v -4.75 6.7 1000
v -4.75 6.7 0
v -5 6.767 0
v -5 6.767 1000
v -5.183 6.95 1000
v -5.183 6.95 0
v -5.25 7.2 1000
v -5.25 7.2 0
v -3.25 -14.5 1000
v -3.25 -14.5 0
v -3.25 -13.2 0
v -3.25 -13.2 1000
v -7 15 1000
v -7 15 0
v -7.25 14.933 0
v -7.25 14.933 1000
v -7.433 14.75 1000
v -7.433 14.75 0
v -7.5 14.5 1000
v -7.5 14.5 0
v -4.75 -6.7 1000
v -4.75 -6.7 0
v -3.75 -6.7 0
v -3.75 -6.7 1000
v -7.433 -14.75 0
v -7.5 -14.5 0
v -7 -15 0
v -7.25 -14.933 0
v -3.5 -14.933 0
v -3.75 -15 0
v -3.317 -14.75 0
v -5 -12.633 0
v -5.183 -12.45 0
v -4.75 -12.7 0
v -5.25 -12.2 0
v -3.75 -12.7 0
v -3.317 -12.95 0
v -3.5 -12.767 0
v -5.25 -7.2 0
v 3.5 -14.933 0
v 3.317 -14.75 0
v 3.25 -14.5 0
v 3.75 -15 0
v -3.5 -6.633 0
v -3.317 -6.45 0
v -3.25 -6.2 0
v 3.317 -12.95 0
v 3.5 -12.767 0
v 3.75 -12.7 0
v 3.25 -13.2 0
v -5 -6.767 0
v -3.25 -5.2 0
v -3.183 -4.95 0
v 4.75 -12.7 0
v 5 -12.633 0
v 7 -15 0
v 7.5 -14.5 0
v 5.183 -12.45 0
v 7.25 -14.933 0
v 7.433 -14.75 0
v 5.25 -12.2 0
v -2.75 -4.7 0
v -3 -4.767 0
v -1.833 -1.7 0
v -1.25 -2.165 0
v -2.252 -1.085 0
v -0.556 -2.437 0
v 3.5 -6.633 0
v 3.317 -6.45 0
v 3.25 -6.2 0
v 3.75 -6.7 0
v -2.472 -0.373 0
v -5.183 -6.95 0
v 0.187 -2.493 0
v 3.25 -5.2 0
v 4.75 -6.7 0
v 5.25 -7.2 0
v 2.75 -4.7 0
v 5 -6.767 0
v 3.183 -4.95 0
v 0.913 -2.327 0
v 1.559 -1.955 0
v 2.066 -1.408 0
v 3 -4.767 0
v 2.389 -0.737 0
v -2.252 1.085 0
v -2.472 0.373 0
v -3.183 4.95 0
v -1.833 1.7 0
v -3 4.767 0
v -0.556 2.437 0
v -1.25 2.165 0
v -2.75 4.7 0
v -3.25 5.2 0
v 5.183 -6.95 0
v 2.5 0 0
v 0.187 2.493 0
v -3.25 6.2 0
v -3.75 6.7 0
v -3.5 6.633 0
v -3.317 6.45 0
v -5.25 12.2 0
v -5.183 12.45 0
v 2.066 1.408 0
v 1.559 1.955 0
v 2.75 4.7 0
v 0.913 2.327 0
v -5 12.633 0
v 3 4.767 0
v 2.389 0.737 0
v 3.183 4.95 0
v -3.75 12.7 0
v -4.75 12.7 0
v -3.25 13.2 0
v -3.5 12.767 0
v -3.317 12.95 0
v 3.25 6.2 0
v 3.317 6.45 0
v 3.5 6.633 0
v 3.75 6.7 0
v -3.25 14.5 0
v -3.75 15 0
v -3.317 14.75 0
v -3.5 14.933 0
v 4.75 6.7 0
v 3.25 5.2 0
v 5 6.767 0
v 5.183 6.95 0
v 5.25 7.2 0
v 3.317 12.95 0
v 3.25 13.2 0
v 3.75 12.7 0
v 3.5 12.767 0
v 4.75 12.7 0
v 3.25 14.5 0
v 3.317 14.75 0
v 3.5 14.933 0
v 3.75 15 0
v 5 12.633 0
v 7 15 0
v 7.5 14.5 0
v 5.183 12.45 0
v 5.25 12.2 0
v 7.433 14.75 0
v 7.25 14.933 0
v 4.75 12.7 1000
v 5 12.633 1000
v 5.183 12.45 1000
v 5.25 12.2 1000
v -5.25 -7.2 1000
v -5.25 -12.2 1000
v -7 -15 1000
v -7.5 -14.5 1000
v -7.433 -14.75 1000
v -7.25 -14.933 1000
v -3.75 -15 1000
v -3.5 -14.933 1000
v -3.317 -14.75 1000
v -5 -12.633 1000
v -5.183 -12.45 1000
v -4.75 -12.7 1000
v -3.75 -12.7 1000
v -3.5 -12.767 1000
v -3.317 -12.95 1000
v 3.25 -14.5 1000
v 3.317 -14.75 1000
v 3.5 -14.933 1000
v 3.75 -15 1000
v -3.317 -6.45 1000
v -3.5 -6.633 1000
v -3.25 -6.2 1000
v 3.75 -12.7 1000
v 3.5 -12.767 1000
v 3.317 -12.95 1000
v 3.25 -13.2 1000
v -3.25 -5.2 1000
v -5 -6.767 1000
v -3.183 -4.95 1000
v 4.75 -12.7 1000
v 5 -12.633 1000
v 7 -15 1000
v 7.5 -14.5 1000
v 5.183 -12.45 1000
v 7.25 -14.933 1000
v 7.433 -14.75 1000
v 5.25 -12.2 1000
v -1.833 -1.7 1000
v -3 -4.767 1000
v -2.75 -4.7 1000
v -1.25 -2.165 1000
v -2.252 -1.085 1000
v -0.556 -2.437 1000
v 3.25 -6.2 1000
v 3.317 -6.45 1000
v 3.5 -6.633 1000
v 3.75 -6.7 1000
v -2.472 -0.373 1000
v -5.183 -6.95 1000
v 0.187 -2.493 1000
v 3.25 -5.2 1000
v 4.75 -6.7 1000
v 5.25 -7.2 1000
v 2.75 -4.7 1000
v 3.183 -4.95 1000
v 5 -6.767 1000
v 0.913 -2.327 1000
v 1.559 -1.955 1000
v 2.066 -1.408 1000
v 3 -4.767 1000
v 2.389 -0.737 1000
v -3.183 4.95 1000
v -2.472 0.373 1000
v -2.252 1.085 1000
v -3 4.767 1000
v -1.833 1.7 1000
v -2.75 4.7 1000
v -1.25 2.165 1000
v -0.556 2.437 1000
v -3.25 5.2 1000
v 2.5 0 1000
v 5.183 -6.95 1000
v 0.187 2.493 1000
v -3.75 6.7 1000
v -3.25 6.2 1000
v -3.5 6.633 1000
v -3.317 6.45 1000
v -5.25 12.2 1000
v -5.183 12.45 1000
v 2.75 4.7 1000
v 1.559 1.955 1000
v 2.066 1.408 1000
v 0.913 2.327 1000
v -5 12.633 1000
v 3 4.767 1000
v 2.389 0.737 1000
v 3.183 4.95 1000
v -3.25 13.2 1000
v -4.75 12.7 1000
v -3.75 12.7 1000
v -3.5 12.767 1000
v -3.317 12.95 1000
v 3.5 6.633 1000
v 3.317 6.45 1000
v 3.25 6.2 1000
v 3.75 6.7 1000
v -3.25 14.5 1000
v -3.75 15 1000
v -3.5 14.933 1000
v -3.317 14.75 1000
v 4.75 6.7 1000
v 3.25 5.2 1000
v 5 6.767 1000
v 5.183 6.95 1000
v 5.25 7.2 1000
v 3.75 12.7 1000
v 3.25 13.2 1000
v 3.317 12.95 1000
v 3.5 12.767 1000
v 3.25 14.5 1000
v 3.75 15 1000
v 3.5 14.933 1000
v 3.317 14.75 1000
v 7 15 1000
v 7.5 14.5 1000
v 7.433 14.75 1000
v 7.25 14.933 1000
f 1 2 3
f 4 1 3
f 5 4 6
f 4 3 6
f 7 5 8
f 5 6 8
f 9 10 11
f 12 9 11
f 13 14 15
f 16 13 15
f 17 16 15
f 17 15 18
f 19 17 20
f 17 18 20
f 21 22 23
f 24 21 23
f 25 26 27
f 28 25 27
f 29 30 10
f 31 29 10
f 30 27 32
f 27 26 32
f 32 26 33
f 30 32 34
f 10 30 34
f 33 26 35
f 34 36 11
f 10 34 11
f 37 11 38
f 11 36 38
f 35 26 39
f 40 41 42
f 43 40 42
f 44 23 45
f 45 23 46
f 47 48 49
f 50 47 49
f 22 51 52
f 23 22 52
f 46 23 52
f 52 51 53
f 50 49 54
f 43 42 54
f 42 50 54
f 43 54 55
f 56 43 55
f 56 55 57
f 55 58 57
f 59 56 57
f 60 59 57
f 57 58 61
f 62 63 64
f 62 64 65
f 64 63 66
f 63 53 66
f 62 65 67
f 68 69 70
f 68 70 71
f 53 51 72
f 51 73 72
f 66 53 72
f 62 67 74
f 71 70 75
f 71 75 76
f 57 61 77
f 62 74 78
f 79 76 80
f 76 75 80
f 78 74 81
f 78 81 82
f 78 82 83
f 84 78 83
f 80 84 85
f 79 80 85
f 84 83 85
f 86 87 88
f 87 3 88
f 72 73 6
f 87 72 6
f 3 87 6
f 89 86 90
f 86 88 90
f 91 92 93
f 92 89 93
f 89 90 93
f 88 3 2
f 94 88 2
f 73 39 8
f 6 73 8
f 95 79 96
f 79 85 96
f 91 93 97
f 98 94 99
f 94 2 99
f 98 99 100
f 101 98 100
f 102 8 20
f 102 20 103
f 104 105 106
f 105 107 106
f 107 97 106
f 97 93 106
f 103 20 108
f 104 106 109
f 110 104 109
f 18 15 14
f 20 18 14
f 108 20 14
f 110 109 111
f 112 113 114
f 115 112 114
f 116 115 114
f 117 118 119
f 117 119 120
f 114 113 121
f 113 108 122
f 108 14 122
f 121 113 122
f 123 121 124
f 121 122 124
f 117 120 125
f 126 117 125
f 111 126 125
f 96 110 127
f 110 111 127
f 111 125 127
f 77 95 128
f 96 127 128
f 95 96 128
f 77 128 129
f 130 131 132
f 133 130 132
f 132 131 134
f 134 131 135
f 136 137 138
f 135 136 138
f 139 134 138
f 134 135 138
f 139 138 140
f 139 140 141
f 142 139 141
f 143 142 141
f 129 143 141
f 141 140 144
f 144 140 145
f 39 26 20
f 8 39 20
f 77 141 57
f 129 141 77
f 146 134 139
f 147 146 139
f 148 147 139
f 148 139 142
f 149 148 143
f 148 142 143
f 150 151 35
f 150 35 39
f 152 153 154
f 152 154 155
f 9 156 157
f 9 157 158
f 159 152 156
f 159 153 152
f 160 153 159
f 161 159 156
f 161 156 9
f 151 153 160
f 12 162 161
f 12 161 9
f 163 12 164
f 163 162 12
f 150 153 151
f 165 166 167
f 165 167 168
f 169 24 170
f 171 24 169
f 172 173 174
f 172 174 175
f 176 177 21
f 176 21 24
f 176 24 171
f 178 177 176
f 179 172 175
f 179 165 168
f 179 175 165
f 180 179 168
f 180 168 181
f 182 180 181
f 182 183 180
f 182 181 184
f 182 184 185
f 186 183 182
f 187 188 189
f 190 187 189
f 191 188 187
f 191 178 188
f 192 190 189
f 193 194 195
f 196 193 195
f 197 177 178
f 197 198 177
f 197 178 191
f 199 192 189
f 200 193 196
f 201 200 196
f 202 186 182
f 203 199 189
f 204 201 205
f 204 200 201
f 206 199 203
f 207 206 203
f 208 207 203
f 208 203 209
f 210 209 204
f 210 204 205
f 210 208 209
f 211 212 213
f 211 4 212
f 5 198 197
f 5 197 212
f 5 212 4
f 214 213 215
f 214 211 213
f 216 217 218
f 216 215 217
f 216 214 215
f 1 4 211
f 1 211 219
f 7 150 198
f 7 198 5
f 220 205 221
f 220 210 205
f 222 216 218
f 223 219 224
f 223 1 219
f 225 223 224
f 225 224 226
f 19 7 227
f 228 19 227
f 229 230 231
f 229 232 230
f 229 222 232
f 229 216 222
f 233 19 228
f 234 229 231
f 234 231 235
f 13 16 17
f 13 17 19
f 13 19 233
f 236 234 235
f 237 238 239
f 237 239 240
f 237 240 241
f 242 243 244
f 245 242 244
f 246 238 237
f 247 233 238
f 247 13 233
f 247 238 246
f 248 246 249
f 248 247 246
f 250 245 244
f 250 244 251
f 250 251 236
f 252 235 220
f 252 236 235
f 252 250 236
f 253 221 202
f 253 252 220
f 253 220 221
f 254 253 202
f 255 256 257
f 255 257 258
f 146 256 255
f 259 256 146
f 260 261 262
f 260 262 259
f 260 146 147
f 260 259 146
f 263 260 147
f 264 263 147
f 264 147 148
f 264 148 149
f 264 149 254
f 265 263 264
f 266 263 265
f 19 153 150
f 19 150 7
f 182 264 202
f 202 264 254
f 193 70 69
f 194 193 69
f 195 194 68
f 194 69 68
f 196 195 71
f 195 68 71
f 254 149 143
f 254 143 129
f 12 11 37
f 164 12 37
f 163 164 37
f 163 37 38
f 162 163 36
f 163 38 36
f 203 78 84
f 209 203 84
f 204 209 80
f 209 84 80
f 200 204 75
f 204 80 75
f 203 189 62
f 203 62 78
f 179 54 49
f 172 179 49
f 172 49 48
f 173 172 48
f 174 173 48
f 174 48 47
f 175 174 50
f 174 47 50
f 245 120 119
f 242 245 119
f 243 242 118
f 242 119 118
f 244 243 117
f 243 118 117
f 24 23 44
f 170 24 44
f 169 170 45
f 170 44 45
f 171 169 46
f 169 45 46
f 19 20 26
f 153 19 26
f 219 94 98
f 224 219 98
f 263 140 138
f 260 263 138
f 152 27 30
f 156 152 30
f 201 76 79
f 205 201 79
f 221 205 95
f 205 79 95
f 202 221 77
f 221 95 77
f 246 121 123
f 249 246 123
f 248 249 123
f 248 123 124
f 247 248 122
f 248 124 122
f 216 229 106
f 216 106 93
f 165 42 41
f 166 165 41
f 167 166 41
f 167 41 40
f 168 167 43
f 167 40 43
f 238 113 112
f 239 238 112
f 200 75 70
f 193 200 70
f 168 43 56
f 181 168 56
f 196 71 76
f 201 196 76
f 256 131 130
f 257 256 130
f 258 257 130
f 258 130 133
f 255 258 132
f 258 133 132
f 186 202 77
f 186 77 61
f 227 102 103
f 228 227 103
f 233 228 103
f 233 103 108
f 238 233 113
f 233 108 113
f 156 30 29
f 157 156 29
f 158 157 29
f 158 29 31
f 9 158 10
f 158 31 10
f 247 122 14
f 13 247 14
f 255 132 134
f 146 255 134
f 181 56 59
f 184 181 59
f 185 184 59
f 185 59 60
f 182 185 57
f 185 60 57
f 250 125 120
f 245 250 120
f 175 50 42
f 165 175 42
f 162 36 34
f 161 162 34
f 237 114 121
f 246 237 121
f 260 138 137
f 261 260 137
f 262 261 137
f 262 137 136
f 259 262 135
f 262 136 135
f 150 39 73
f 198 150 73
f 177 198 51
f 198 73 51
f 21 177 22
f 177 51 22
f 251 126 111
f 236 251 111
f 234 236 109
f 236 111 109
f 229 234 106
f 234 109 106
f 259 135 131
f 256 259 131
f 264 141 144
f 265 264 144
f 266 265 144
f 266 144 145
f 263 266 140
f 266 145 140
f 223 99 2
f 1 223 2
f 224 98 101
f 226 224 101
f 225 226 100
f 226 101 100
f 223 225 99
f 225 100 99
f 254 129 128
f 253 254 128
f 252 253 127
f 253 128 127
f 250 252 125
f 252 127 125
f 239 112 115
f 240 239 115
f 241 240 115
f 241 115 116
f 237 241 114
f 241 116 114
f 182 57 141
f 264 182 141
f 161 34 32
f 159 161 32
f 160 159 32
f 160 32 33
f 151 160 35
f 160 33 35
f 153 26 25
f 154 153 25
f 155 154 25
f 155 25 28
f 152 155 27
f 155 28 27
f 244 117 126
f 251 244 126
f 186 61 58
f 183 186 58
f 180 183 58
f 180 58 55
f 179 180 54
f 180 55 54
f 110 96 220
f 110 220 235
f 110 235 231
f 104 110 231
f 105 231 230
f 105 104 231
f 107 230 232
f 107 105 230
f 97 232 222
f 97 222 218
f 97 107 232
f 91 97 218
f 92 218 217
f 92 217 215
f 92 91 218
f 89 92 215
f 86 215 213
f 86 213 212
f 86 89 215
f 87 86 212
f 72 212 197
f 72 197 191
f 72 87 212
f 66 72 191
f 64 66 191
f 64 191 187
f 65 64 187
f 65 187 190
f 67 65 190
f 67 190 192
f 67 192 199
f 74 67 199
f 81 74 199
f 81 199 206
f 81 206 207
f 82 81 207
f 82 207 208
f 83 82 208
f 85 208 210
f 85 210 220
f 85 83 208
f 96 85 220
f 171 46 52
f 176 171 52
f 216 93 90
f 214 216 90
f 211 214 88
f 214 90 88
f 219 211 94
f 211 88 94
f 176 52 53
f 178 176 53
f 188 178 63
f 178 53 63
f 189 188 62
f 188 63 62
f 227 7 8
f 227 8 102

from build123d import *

# Parameters (mm, degrees)
SKETCH_2_R      = 2.5
EXTRUDE_1_DEPTH = 1000


with BuildPart() as part:
    # Эскиз2 → Бобышка-Вытянуть1 (new body)
    with BuildSketch(Plane.XY):
        with BuildLine():
            Line((-5.25, 15), (-7, 15))
            ThreePointArc((-7, 15), (-7.353553391, 14.853553391), (-7.5, 14.5))
            Line((-7.5, 14.5), (-7.5, -14.5))
            ThreePointArc((-7.5, -14.5), (-7.353553391, -14.853553391), (-7, -15))
            Line((-7, -15), (-5.25, -15))
            Line((-5.25, -15), (-3.75, -15))
            ThreePointArc((-3.75, -15), (-3.396446609, -14.853553391), (-3.25, -14.5))
            Line((-3.25, -14.5), (-3.25, -13.2))
            ThreePointArc((-3.25, -13.2), (-3.396446609, -12.846446609), (-3.75, -12.7))
            Line((-3.75, -12.7), (-4.75, -12.7))
            ThreePointArc((-4.75, -12.7), (-5.103553391, -12.553553391), (-5.25, -12.2))
            Line((-5.25, -12.2), (-5.25, -7.2))
            ThreePointArc((-5.25, -7.2), (-5.103553391, -6.846446609), (-4.75, -6.7))
            Line((-4.75, -6.7), (-3.75, -6.7))
            ThreePointArc((-3.75, -6.7), (-3.396446609, -6.553553391), (-3.25, -6.2))
            Line((-3.25, -6.2), (-3.25, -5.2))
            ThreePointArc((-3.25, -5.2), (-3.103553391, -4.846446609), (-2.75, -4.7))
            Line((-2.75, -4.7), (2.75, -4.7))
            ThreePointArc((2.75, -4.7), (3.103553391, -4.846446609), (3.25, -5.2))
            Line((3.25, -5.2), (3.25, -6.2))
            ThreePointArc((3.25, -6.2), (3.396446609, -6.553553391), (3.75, -6.7))
            Line((3.75, -6.7), (4.75, -6.7))
            ThreePointArc((4.75, -6.7), (5.103553391, -6.846446609), (5.25, -7.2))
            Line((5.25, -7.2), (5.25, -12.2))
            ThreePointArc((5.25, -12.2), (5.103553391, -12.553553391), (4.75, -12.7))
            Line((4.75, -12.7), (3.75, -12.7))
            ThreePointArc((3.75, -12.7), (3.396446609, -12.846446609), (3.25, -13.2))
            Line((3.25, -13.2), (3.25, -14.5))
            ThreePointArc((3.25, -14.5), (3.396446609, -14.853553391), (3.75, -15))
            Line((3.75, -15), (5.25, -15))
            Line((5.25, -15), (7, -15))
            ThreePointArc((7, -15), (7.353553391, -14.853553391), (7.5, -14.5))
            Line((7.5, -14.5), (7.5, 14.5))
            ThreePointArc((7.5, 14.5), (7.353553391, 14.853553391), (7, 15))
            Line((7, 15), (5.25, 15))
            Line((5.25, 15), (3.75, 15))
            ThreePointArc((3.75, 15), (3.396446609, 14.853553391), (3.25, 14.5))
            Line((3.25, 14.5), (3.25, 13.2))
            ThreePointArc((3.25, 13.2), (3.396446609, 12.846446609), (3.75, 12.7))
            Line((3.75, 12.7), (4.75, 12.7))
            ThreePointArc((4.75, 12.7), (5.103553391, 12.553553391), (5.25, 12.2))
            Line((5.25, 12.2), (5.25, 7.2))
            ThreePointArc((5.25, 7.2), (5.103553391, 6.846446609), (4.75, 6.7))
            Line((4.75, 6.7), (3.75, 6.7))
            ThreePointArc((3.75, 6.7), (3.396446609, 6.553553391), (3.25, 6.2))
            Line((3.25, 6.2), (3.25, 5.2))
            ThreePointArc((3.25, 5.2), (3.103553391, 4.846446609), (2.75, 4.7))
            Line((2.75, 4.7), (-2.75, 4.7))
            ThreePointArc((-2.75, 4.7), (-3.103553391, 4.846446609), (-3.25, 5.2))
            Line((-3.25, 5.2), (-3.25, 6.2))
            ThreePointArc((-3.25, 6.2), (-3.396446609, 6.553553391), (-3.75, 6.7))
            Line((-3.75, 6.7), (-4.75, 6.7))
            ThreePointArc((-4.75, 6.7), (-5.103553391, 6.846446609), (-5.25, 7.2))
            Line((-5.25, 7.2), (-5.25, 12.2))
            ThreePointArc((-5.25, 12.2), (-5.103553391, 12.553553391), (-4.75, 12.7))
            Line((-4.75, 12.7), (-3.75, 12.7))
            ThreePointArc((-3.75, 12.7), (-3.396446609, 12.846446609), (-3.25, 13.2))
            Line((-3.25, 13.2), (-3.25, 14.5))
            ThreePointArc((-3.25, 14.5), (-3.396446609, 14.853553391), (-3.75, 15))
            Line((-3.75, 15), (-5.25, 15))
        make_face()
        Circle(SKETCH_2_R, mode=Mode.SUBTRACT)
    extrude(amount=EXTRUDE_1_DEPTH)


solid = part.part
